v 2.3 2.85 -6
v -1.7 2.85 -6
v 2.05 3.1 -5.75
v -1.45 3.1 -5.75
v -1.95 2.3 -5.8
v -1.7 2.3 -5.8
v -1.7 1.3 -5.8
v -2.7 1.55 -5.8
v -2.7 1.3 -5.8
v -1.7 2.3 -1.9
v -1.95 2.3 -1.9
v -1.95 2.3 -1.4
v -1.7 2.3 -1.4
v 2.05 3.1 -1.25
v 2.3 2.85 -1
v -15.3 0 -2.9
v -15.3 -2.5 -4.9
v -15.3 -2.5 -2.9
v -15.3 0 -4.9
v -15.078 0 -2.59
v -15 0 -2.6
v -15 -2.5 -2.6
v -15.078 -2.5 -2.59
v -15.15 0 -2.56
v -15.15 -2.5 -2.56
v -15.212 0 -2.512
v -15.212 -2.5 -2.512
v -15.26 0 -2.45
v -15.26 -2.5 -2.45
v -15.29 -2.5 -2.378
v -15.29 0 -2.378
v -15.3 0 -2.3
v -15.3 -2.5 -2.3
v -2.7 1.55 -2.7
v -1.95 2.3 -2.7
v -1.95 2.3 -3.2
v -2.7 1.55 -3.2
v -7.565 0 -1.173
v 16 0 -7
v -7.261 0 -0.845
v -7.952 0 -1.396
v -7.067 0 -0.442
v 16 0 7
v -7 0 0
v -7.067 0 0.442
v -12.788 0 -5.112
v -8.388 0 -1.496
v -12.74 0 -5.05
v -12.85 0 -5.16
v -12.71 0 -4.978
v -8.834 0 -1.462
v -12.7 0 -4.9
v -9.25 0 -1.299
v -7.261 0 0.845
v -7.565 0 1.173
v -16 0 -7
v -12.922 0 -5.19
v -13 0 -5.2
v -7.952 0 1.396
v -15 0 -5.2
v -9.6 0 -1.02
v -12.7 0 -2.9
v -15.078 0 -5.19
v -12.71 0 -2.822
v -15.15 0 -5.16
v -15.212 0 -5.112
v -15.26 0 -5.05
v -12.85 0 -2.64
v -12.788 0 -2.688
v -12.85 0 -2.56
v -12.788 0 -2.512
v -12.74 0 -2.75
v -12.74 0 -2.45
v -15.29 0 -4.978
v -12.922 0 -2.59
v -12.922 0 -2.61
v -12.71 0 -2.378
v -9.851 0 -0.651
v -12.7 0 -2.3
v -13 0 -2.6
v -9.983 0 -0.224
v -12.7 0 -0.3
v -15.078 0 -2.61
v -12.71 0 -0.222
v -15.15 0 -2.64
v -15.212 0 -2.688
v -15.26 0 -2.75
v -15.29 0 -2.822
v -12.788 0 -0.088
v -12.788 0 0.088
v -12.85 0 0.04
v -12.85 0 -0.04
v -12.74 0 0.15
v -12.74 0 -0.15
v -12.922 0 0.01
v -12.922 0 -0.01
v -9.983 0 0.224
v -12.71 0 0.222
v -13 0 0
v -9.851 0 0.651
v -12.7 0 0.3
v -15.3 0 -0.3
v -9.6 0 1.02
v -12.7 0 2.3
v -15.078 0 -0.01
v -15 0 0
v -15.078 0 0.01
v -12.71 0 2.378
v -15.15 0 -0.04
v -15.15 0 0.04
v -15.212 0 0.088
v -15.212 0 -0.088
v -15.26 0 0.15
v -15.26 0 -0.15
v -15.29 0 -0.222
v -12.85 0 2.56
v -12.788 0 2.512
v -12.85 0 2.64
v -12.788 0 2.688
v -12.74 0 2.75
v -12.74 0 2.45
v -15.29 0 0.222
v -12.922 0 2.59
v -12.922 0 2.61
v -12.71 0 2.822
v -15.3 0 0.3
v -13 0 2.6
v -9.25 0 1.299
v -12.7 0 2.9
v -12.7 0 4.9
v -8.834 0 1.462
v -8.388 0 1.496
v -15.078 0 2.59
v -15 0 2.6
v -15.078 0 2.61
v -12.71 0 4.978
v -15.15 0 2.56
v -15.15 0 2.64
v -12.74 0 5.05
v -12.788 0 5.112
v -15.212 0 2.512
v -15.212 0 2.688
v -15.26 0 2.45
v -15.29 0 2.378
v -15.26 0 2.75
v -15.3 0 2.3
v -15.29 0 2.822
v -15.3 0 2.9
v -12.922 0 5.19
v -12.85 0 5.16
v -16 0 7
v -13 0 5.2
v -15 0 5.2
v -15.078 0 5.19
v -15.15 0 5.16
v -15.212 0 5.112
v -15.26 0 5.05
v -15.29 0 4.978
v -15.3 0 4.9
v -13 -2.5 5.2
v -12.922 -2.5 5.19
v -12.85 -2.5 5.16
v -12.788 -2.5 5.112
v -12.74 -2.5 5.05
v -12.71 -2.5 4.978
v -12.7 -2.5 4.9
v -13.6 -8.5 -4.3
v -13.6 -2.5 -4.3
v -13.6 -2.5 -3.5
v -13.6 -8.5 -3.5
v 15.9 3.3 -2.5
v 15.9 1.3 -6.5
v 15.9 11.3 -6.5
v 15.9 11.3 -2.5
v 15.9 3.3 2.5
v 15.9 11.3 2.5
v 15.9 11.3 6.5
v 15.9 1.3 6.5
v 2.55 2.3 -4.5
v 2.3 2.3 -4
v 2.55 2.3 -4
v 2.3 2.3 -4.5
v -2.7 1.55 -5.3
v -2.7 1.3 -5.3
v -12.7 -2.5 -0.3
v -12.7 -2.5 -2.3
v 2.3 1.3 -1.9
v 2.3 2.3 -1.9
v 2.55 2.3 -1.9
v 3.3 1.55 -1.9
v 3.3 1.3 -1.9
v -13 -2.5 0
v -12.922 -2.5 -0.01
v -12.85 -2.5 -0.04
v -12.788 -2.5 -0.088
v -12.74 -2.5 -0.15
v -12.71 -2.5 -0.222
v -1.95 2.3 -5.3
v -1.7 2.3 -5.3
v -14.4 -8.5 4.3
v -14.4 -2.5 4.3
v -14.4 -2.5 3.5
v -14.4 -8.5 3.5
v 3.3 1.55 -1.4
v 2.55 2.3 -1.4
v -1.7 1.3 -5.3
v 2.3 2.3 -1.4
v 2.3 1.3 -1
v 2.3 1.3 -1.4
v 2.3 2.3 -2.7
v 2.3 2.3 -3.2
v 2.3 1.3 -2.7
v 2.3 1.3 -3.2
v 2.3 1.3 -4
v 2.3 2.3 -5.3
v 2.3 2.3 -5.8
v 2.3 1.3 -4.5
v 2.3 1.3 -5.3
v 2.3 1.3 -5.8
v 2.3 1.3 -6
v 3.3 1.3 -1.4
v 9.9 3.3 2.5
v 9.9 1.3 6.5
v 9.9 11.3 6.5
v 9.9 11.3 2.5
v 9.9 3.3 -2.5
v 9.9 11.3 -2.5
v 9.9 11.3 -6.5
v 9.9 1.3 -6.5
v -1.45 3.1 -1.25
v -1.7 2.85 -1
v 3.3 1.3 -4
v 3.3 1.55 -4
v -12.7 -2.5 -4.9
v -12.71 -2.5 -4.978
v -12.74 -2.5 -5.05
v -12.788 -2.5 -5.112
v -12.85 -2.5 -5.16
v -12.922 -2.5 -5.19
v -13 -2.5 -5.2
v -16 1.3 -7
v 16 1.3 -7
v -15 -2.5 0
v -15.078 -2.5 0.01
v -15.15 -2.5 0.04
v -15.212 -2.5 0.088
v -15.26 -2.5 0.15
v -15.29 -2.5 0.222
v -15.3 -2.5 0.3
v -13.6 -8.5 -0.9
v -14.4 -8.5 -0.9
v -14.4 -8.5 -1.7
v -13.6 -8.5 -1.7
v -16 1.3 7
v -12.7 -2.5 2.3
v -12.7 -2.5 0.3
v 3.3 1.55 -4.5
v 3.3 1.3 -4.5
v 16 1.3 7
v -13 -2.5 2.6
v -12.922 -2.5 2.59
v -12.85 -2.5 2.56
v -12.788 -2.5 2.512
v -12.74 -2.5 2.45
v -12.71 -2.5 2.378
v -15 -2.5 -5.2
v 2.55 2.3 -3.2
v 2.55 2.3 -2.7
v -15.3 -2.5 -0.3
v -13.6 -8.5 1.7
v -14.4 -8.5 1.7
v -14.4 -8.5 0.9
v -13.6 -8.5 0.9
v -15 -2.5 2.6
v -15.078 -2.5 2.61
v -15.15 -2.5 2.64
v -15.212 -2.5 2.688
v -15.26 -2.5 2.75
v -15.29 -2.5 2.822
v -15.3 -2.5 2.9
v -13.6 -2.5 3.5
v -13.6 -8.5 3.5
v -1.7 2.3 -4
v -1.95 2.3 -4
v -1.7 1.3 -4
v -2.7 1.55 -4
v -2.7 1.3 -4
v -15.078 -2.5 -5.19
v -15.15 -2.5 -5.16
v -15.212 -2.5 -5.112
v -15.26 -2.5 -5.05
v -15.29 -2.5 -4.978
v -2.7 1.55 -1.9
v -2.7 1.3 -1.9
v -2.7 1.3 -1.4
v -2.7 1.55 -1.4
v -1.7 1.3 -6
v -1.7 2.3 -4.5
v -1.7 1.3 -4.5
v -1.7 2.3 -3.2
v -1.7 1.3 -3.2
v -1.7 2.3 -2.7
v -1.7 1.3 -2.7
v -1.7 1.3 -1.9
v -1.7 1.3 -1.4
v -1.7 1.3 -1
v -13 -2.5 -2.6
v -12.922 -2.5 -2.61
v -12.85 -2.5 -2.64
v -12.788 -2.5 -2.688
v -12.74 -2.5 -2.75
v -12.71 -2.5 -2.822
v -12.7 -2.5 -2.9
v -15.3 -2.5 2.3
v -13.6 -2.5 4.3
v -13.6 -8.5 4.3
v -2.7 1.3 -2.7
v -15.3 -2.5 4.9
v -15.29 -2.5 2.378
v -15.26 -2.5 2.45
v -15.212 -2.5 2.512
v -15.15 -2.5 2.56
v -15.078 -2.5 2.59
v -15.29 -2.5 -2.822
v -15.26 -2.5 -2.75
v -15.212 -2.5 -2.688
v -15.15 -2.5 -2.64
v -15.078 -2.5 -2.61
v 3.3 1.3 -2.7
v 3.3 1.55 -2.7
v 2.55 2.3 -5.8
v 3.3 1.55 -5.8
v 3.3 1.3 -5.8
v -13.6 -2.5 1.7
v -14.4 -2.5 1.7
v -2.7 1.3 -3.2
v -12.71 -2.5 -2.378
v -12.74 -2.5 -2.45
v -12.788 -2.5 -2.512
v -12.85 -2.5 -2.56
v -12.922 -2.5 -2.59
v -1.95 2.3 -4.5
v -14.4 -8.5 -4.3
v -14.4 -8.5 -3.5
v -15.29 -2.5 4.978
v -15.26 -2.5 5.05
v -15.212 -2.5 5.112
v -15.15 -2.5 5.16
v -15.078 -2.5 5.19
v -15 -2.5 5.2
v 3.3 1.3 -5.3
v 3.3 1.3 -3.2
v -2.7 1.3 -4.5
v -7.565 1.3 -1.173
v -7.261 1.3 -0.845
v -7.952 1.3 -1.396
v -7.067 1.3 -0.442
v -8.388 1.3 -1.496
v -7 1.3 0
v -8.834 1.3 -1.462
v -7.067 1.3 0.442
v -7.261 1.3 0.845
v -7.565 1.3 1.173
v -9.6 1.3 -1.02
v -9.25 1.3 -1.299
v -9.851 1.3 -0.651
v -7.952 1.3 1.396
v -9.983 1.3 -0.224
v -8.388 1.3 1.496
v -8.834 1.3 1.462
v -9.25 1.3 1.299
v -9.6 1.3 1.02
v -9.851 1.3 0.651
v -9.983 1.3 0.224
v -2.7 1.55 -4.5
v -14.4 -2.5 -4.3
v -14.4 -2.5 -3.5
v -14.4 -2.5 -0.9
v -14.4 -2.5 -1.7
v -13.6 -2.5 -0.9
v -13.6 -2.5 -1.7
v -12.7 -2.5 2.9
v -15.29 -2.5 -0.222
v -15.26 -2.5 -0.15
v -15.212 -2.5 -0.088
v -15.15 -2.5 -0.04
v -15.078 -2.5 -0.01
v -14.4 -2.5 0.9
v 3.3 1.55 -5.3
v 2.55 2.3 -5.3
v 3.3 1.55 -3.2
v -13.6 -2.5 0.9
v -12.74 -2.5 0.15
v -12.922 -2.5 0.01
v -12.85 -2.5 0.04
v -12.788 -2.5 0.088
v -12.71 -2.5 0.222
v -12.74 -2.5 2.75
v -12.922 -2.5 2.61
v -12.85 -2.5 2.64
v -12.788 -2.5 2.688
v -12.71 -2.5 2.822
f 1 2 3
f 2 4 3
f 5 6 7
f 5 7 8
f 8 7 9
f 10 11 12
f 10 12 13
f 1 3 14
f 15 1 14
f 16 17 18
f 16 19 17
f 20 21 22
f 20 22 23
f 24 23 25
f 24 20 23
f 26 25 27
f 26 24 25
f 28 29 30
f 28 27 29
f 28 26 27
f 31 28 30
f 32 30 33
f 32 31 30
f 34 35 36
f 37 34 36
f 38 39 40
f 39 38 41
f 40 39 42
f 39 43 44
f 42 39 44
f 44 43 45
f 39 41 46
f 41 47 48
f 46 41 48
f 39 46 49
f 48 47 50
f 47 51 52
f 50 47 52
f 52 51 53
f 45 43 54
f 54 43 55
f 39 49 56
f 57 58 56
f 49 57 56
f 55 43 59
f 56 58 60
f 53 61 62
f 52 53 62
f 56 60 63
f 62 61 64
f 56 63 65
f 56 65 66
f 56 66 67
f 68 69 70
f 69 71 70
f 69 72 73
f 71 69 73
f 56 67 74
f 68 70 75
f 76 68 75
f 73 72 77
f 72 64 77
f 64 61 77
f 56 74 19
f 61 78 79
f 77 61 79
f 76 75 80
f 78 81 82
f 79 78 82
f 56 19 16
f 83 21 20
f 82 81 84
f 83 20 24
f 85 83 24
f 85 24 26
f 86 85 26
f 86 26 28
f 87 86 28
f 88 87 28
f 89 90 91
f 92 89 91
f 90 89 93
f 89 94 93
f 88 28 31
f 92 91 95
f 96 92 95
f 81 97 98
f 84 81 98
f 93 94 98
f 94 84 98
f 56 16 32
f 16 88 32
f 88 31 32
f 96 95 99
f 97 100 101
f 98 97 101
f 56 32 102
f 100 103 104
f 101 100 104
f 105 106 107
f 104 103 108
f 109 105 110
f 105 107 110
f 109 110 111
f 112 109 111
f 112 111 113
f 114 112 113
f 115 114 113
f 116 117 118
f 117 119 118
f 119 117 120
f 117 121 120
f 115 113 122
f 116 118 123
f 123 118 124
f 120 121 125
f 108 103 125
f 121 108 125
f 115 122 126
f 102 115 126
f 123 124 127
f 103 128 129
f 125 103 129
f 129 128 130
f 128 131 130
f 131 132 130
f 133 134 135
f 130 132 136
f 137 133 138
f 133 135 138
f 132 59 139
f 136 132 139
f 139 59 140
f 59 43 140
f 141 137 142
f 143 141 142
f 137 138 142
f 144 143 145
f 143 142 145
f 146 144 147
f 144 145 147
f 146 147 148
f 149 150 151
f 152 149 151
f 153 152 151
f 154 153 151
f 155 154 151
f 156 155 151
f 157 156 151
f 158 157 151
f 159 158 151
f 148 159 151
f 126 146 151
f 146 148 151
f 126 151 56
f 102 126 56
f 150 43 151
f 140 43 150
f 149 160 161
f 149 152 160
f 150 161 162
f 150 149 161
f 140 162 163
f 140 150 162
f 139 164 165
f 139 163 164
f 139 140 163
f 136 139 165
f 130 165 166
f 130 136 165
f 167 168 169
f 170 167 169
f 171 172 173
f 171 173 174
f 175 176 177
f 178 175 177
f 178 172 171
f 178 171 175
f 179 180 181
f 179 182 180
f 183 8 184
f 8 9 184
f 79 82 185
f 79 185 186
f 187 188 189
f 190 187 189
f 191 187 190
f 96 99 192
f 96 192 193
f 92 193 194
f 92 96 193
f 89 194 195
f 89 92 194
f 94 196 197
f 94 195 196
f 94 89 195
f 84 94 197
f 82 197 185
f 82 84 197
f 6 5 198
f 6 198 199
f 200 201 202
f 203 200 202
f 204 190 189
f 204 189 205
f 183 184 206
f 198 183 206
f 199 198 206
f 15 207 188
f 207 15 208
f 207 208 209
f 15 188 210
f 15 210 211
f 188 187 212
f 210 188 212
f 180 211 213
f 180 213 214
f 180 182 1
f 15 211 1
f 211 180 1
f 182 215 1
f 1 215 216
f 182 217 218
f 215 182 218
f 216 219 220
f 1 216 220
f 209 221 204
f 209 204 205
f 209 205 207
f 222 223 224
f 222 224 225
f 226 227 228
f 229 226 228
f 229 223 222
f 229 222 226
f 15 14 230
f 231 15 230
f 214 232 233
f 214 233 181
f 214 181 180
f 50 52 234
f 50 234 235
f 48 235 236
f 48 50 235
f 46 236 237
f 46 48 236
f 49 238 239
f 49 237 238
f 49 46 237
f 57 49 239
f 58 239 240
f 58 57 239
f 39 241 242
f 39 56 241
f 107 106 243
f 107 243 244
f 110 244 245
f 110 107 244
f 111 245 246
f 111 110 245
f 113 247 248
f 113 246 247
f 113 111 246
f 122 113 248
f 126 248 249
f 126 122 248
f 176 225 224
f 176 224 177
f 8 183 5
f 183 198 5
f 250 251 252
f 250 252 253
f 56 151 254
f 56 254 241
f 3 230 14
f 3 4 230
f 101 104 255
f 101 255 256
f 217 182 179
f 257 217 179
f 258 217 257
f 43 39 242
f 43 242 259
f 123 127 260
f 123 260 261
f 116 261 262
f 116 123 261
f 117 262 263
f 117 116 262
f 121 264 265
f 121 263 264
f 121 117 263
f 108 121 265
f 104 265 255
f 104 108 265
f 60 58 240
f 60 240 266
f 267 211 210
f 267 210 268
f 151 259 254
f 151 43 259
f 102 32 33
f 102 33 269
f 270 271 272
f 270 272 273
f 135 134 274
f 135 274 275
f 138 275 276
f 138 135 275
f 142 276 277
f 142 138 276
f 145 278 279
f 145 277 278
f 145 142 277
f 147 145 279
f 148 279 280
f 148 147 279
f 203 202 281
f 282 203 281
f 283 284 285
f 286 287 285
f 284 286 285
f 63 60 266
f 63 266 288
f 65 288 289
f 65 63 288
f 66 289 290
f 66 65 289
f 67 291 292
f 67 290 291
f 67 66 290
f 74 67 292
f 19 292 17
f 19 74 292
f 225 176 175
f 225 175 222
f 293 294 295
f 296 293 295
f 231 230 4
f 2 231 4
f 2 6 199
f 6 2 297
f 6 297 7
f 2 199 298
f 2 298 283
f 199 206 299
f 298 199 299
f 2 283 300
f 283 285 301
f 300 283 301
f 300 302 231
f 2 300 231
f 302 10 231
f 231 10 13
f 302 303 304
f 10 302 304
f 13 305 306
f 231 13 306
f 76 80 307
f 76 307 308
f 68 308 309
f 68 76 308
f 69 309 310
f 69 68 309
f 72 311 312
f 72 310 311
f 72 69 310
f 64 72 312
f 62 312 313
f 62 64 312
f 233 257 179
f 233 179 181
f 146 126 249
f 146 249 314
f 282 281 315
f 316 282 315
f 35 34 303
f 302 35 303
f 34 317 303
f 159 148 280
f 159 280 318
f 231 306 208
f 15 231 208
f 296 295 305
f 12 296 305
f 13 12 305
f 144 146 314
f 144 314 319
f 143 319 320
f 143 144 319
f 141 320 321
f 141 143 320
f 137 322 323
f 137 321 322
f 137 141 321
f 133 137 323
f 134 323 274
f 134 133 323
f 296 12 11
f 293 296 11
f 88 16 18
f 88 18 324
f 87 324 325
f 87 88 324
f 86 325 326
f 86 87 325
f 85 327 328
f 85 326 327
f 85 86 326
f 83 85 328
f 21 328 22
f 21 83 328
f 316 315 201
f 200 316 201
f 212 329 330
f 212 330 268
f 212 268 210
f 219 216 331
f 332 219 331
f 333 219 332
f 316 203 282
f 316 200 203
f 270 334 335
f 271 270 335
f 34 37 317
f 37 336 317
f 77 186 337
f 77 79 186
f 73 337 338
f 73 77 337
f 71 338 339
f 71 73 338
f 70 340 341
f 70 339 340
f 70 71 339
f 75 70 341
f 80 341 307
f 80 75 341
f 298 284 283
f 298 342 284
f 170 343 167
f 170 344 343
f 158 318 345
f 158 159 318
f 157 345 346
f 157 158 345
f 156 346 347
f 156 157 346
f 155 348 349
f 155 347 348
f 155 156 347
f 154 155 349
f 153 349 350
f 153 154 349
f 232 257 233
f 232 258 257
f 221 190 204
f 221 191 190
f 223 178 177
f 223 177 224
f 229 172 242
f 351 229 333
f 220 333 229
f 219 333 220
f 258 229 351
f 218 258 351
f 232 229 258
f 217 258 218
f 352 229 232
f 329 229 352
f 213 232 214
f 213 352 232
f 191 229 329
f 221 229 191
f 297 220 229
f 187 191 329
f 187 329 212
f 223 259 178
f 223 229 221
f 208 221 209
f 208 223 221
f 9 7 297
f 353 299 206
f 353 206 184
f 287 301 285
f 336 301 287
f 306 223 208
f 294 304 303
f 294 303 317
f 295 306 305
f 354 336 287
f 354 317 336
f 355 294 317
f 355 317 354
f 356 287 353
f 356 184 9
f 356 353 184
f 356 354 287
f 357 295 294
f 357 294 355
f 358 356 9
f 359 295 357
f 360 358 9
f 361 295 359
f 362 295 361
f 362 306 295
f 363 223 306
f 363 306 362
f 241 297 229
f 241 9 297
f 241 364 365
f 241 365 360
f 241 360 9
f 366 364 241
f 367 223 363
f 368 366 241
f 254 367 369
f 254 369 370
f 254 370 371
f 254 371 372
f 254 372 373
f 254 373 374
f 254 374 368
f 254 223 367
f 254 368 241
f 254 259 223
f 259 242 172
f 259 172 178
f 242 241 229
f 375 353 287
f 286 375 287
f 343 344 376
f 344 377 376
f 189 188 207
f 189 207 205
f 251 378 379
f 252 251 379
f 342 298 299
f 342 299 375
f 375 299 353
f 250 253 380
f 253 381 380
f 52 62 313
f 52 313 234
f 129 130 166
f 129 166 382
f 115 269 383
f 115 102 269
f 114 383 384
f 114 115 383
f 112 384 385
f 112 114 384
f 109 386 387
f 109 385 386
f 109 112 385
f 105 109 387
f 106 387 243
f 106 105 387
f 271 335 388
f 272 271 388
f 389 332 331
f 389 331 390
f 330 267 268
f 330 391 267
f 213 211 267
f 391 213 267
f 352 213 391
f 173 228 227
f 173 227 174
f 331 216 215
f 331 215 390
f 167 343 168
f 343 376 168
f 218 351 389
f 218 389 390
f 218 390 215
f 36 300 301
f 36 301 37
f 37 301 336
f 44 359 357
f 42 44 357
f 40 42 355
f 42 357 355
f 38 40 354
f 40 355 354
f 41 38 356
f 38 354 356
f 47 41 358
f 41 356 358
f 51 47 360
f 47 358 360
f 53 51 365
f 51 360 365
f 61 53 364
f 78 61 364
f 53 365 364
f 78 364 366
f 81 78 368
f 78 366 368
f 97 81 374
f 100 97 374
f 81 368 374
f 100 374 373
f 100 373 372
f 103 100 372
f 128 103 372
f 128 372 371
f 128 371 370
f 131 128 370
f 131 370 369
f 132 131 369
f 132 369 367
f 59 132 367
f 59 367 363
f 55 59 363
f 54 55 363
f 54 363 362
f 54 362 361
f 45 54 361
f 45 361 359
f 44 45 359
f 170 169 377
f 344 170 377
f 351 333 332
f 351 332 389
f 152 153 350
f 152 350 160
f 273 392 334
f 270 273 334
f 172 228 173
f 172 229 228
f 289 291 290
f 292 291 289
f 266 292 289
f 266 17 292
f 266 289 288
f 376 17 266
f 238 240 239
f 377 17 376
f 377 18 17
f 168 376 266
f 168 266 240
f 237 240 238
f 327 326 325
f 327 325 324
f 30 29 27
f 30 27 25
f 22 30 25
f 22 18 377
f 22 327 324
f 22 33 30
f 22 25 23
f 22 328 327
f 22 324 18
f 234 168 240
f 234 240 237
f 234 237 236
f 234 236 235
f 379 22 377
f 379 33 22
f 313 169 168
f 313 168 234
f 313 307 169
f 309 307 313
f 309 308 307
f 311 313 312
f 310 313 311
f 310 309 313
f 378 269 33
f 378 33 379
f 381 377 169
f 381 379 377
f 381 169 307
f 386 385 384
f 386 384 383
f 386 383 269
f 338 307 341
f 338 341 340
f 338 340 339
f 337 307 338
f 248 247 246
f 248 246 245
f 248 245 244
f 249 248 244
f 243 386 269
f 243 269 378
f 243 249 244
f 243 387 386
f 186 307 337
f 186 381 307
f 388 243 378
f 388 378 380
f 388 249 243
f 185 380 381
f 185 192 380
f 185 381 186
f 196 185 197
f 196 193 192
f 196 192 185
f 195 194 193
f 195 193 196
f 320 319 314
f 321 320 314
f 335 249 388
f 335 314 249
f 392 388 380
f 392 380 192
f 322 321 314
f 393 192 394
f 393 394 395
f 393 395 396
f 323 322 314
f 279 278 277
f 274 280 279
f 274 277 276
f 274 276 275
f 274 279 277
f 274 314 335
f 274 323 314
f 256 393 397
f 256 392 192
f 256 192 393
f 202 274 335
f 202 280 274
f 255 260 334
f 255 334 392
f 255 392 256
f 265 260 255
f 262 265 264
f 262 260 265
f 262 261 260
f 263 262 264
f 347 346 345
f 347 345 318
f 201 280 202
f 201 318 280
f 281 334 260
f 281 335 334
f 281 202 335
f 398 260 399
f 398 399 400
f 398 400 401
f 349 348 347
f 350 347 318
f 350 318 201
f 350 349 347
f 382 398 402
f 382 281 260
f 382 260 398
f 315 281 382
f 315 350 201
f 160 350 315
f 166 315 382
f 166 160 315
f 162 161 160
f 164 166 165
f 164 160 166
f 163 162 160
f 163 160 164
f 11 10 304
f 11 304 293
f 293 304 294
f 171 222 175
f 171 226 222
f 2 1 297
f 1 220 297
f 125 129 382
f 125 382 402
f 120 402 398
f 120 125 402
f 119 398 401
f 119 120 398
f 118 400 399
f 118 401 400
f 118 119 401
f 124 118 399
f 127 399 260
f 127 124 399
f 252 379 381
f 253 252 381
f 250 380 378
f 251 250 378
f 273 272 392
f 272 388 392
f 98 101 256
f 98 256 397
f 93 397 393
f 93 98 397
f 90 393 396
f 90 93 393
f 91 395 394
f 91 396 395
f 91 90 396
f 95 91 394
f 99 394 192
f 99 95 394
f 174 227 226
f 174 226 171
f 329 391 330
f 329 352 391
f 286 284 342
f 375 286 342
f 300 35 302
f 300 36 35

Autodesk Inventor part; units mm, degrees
ref_plane "YZ Plane" through (0, 0, 0) normal (1, 0, 0) x (0, 1, 0)
ref_plane "XZ Plane" through (0, 0, 0) normal (0, 1, 0) x (-1, 0, 0)
ref_plane "XY Plane" through (0, 0, 0) normal (0, 0, 1) x (1, 0, 0)
sketch "Эскиз1" plane through (0, 0, 0) normal (0, 1, 0) x (-1, 0, 0)
  line L0 (-16, 7) -> (16, 7)
  line L1 (16, 7) -> (16, -7)
  line L2 (16, -7) -> (-16, -7)
  line L3 (-16, -7) -> (-16, 7)
  line L4 (-16, 7) -> (16, -7) construction
  line L5 (16, 7) -> (-16, -7) construction
  point P0 (0, 0)
  dimension "d0" = 32
  dimension "d1" = 14
extrude "Выдавливание1" add sketch "Эскиз1" along normal blind 1.3
sketch "Эскиз4" plane through (0, 1.3, 0) normal (0, 1, 0) x (1, 0, 0)
  line L0 (-16, -7) -> (16, -7) projected
  line L1 (16, -7) -> (16, -6.5)
  line L2 (16, -7) -> (16, 7) projected
  line L3 (16, -6.5) -> (15.9, -6.5)
  line L4 (15.9, -6.5) -> (9.9, -6.5)
  line L5 (9.9, -6.5) -> (9.9, 6.5)
  line L6 (9.9, 6.5) -> (15.9, 6.5)
  line L7 (15.9, 6.5) -> (15.9, -6.5)
  point P0 (0, 0)
  dimension "d13" = 0.5
  dimension "d14" = 0.1
  dimension "d15" = 6
  dimension "d16" = 13
extrude "Выдавливание4" add sketch "Эскиз4" along normal blind 10
sketch "Эскиз5" plane through (0, 11.3, 0) normal (0, 1, 0) x (1, 0, 0)
  line L0 (9.9, 6.5) -> (9.9, -6.5) projected
  line L1 (15.9, -2.5) -> (9.9, -2.5)
  line L2 (9.9, -2.5) -> (9.9, 2.5)
  line L3 (9.9, 2.5) -> (15.9, 2.5)
  line L4 (15.9, 2.5) -> (15.9, -2.5)
  line L5 (15.9, -2.5) -> (9.9, 2.5) construction
  line L6 (9.9, -2.5) -> (15.9, 2.5) construction
  point P0 (0, 0)
  point P1 (12.9, 0)
  dimension "d19" = 5
extrude "Выдавливание5" cut sketch "Эскиз5" against normal blind 8
sketch "Эскиз6" plane through (0, 1.3, 0) normal (0, 1, 0) x (1, 0, 0)
  line L0 (-16, 7) -> (-16, -7) projected
  line L1 (-16, 0) -> (-10, 0)
  line L2 (-10, 0) -> (-7, 0)
  circle A0 centre (-8.5, 0) radius 1.5
  point P0 (0, 0)
  dimension "d22" = 6
  dimension "d23" = 3
extrude "Выдавливание6" cut sketch "Эскиз6" against normal blind 8
sketch "Эскиз10" plane through (0, 1.3, 0) normal (0, 1, 0) x (1, 0, 0)
  line L0 (2.3, 6) -> (-1.7, 6)
  line L1 (-1.7, 6) -> (-1.7, 1)
  line L2 (-1.7, 1) -> (2.3, 1)
  line L3 (2.3, 1) -> (2.3, 6)
  line L4 (-12.7, 2.9) -> (-12.7, 4.9) projected
  line L5 (16, 7) -> (-16, 7) projected
  point P0 (0, 0)
  dimension "d49" = 4
  dimension "d50" = 5
  dimension "d51" = 11
  dimension "d52" = 1
extrude "Выдавливание9" add sketch "Эскиз10" along normal blind 1.8
chamfer "Фаска1" distance 0.25 angle 45 4 edges at (-1.7, 3.1, -3.5) (0.3, 3.1, -1) (2.3, 3.1, -3.5) (0.3, 3.1, -6)
sketch "Эскиз11" plane through (0, 1.3, 0) normal (0, 1, 0) x (1, 0, 0)
  line L0 (-1.7, 1) -> (-1.7, 6) projected
  line L1 (-1.7, 6) -> (-1.7, 5.8)
  line L2 (-1.7, 5.8) -> (-2.7, 5.8)
  line L3 (-2.7, 5.8) -> (-2.7, 5.3)
  line L4 (-2.7, 5.3) -> (-1.7, 5.3)
  line L5 (-1.7, 5.3) -> (-1.7, 5.8)
  line L6 (-1.7, 4.7) -> (-1.7, 4.5)
  line L7 (-1.7, 4.5) -> (-2.7, 4.5)
  line L8 (-2.7, 4.5) -> (-2.7, 4)
  line L9 (-2.7, 4) -> (-1.7, 4)
  line L10 (-1.7, 4) -> (-1.7, 4.5)
  line L11 (-1.7, 3.4) -> (-1.7, 3.2)
  line L12 (-1.7, 3.2) -> (-2.7, 3.2)
  line L13 (-2.7, 3.2) -> (-2.7, 2.7)
  line L14 (-2.7, 2.7) -> (-1.7, 2.7)
  line L15 (-1.7, 2.7) -> (-1.7, 3.2)
  line L16 (-1.7, 2.1) -> (-1.7, 1.9)
  line L17 (-1.7, 1.9) -> (-2.7, 1.9)
  line L18 (-2.7, 1.9) -> (-2.7, 1.4)
  line L19 (-2.7, 1.4) -> (-1.7, 1.4)
  line L20 (-1.7, 1.4) -> (-1.7, 1.9)
  line L21 (-1.7, 6) -> (2.3, 6) projected
  line L22 (0.3, 6) -> (0.3, 4.6)
  line L23 (2.3, 1) -> (2.3, 6)
  line L24 (2.3, 6) -> (2.3, 5.8)
  line L25 (2.3, 5.8) -> (3.3, 5.8)
  line L26 (3.3, 5.8) -> (3.3, 5.3)
  line L27 (3.3, 5.3) -> (2.3, 5.3)
  line L28 (2.3, 5.3) -> (2.3, 5.8)
  line L29 (2.3, 4.7) -> (2.3, 4.5)
  line L30 (2.3, 4.5) -> (3.3, 4.5)
  line L31 (3.3, 4.5) -> (3.3, 4)
  line L32 (3.3, 4) -> (2.3, 4)
  line L33 (2.3, 4) -> (2.3, 4.5)
  line L34 (2.3, 3.4) -> (2.3, 3.2)
  line L35 (2.3, 3.2) -> (3.3, 3.2)
  line L36 (3.3, 3.2) -> (3.3, 2.7)
  line L37 (3.3, 2.7) -> (2.3, 2.7)
  line L38 (2.3, 2.7) -> (2.3, 3.2)
  line L39 (2.3, 2.1) -> (2.3, 1.9)
  line L40 (2.3, 1.9) -> (3.3, 1.9)
  line L41 (3.3, 1.9) -> (3.3, 1.4)
  line L42 (3.3, 1.4) -> (2.3, 1.4)
  line L43 (2.3, 1.4) -> (2.3, 1.9)
  point P0 (0, 0)
  dimension "d58" = 0.2
  dimension "d59" = 1
  dimension "d60" = 0.5
  dimension "d63" = 1.3
extrude "Выдавливание10" add sketch "Эскиз11" along normal blind 1
chamfer "Фаска2" distance 0.75 angle 45 8 edges at (-2.7, 2.3, -5.55) (-2.7, 2.3, -4.25) (-2.7, 2.3, -2.95) (-2.7, 2.3, -1.65) (3.3, 2.3, -1.65) (3.3, 2.3, -2.95) (3.3, 2.3, -4.25) (3.3, 2.3, -5.55)
sketch "Эскиз18" plane through (0, 0, 0) normal (0, -1, 0) x (1, 0, 0)
  line L0 (16, 7) -> (-16, 7) projected
  line L1 (-16, 7) -> (-15.3, 7)
  line L2 (-15.3, 7) -> (-15.3, 5.2)
  line L3 (-15, 5.2) -> (-13, 5.2)
  line L4 (-12.7, 4.9) -> (-12.7, 2.9)
  line L5 (-13, 2.6) -> (-15, 2.6)
  line L6 (-15.3, 2.9) -> (-15.3, 4.9)
  arc A0 (-12.7, 4.9) -> (-13, 5.2) centre (-13, 4.9) ccw
  arc A1 (-13, 2.6) -> (-12.7, 2.9) centre (-13, 2.9) ccw
  arc A2 (-15.3, 2.9) -> (-15, 2.6) centre (-15, 2.9) ccw
  arc A3 (-15, 5.2) -> (-15.3, 4.9) centre (-15, 4.9) ccw
  line L7 (-15.3, 4.4) -> (-15.3, 2.6)
  arc A4 (-15, 2.6) -> (-15.3, 2.3) centre (-15, 2.3) ccw
  line L8 (-15, 2.6) -> (-13, 2.6)
  arc A5 (-12.7, 2.3) -> (-13, 2.6) centre (-13, 2.3) ccw
  line L9 (-15.3, 0.3) -> (-15.3, 2.3)
  arc A6 (-15.3, 0.3) -> (-15, 0) centre (-15, 0.3) ccw
  line L10 (-12.7, 2.3) -> (-12.7, 0.3)
  arc A7 (-13, 0) -> (-12.7, 0.3) centre (-13, 0.3) ccw
  line L11 (-13, 0) -> (-15, 0)
  line L12 (-15.3, 1.8) -> (-15.3, 0)
  arc A8 (-15, 0) -> (-15.3, -0.3) centre (-15, -0.3) ccw
  line L13 (-15, 0) -> (-13, 0)
  arc A9 (-12.7, -0.3) -> (-13, 0) centre (-13, -0.3) ccw
  line L14 (-15.3, -2.3) -> (-15.3, -0.3)
  arc A10 (-15.3, -2.3) -> (-15, -2.6) centre (-15, -2.3) ccw
  line L15 (-12.7, -0.3) -> (-12.7, -2.3)
  arc A11 (-13, -2.6) -> (-12.7, -2.3) centre (-13, -2.3) ccw
  line L16 (-13, -2.6) -> (-15, -2.6)
  line L17 (-15.3, -0.8) -> (-15.3, -2.6)
  arc A12 (-15, -2.6) -> (-15.3, -2.9) centre (-15, -2.9) ccw
  line L18 (-15, -2.6) -> (-13, -2.6)
  arc A13 (-12.7, -2.9) -> (-13, -2.6) centre (-13, -2.9) ccw
  line L19 (-15.3, -4.9) -> (-15.3, -2.9)
  arc A14 (-15.3, -4.9) -> (-15, -5.2) centre (-15, -4.9) ccw
  line L20 (-12.7, -2.9) -> (-12.7, -4.9)
  arc A15 (-13, -5.2) -> (-12.7, -4.9) centre (-13, -4.9) ccw
  line L21 (-13, -5.2) -> (-15, -5.2)
  point P0 (0, 0)
  point P1 (-12.7, 2.6)
  point P2 (-12.7, 5.2)
  point P3 (-12.7, 2.6)
  point P4 (-12.7, 0)
  point P5 (-12.7, 0)
  point P6 (-12.7, -2.6)
  point P7 (-12.7, -2.6)
  point P8 (-15.3, -5.2)
  point P9 (-12.7, -5.2)
  dimension "d105" = 0.7
  dimension "d106" = 1.8
  dimension "d107" = 2.6
  dimension "d108" = 2.6
  dimension "d109" = 0.3
  dimension "d112" = 2.6
extrude "Выдавливание11" add sketch "Эскиз18" along normal blind 2.5
sketch "Эскиз19" plane through (0, -2.5, 0) normal (0, -1, 0) x (1, 0, 0)
  line L0 (-15, 5.2) -> (-13, 5.2) projected
  line L1 (-14, 5.2) -> (-14, 3.9)
  line L2 (-14.4, 3.5) -> (-13.6, 3.5)
  line L3 (-13.6, 3.5) -> (-13.6, 4.3)
  line L4 (-13.6, 4.3) -> (-14.4, 4.3)
  line L5 (-14.4, 4.3) -> (-14.4, 3.5)
  line L6 (-14.4, 3.5) -> (-13.6, 4.3) construction
  line L7 (-13.6, 3.5) -> (-14.4, 4.3) construction
  line L8 (-14.4, 0.9) -> (-13.6, 0.9)
  line L9 (-13.6, 0.9) -> (-13.6, 1.7)
  line L10 (-13.6, 1.7) -> (-14.4, 1.7)
  line L11 (-14.4, 1.7) -> (-14.4, 0.9)
  line L12 (-14.4, 0.9) -> (-13.6, 1.7) construction
  line L13 (-13.6, 0.9) -> (-14.4, 1.7) construction
  line L14 (-14.4, -1.7) -> (-13.6, -1.7)
  line L15 (-13.6, -1.7) -> (-13.6, -0.9)
  line L16 (-13.6, -0.9) -> (-14.4, -0.9)
  line L17 (-14.4, -0.9) -> (-14.4, -1.7)
  line L18 (-14.4, -1.7) -> (-13.6, -0.9) construction
  line L19 (-13.6, -1.7) -> (-14.4, -0.9) construction
  line L20 (-14.4, -4.3) -> (-13.6, -4.3)
  line L21 (-13.6, -4.3) -> (-13.6, -3.5)
  line L22 (-13.6, -3.5) -> (-14.4, -3.5)
  line L23 (-14.4, -3.5) -> (-14.4, -4.3)
  line L24 (-14.4, -4.3) -> (-13.6, -3.5) construction
  line L25 (-13.6, -4.3) -> (-14.4, -3.5) construction
  point P0 (0, 0)
  point P1 (-14, 1.3)
  point P2 (-14, -1.3)
  point P3 (-14, -3.9)
  dimension "d119" = 1.3
  dimension "d120" = 0.8
  dimension "d121" = 0.8
  dimension "d124" = 2.6
extrude "Выдавливание12" add sketch "Эскиз19" along normal blind 6
properties part number "Оптический датчик"
